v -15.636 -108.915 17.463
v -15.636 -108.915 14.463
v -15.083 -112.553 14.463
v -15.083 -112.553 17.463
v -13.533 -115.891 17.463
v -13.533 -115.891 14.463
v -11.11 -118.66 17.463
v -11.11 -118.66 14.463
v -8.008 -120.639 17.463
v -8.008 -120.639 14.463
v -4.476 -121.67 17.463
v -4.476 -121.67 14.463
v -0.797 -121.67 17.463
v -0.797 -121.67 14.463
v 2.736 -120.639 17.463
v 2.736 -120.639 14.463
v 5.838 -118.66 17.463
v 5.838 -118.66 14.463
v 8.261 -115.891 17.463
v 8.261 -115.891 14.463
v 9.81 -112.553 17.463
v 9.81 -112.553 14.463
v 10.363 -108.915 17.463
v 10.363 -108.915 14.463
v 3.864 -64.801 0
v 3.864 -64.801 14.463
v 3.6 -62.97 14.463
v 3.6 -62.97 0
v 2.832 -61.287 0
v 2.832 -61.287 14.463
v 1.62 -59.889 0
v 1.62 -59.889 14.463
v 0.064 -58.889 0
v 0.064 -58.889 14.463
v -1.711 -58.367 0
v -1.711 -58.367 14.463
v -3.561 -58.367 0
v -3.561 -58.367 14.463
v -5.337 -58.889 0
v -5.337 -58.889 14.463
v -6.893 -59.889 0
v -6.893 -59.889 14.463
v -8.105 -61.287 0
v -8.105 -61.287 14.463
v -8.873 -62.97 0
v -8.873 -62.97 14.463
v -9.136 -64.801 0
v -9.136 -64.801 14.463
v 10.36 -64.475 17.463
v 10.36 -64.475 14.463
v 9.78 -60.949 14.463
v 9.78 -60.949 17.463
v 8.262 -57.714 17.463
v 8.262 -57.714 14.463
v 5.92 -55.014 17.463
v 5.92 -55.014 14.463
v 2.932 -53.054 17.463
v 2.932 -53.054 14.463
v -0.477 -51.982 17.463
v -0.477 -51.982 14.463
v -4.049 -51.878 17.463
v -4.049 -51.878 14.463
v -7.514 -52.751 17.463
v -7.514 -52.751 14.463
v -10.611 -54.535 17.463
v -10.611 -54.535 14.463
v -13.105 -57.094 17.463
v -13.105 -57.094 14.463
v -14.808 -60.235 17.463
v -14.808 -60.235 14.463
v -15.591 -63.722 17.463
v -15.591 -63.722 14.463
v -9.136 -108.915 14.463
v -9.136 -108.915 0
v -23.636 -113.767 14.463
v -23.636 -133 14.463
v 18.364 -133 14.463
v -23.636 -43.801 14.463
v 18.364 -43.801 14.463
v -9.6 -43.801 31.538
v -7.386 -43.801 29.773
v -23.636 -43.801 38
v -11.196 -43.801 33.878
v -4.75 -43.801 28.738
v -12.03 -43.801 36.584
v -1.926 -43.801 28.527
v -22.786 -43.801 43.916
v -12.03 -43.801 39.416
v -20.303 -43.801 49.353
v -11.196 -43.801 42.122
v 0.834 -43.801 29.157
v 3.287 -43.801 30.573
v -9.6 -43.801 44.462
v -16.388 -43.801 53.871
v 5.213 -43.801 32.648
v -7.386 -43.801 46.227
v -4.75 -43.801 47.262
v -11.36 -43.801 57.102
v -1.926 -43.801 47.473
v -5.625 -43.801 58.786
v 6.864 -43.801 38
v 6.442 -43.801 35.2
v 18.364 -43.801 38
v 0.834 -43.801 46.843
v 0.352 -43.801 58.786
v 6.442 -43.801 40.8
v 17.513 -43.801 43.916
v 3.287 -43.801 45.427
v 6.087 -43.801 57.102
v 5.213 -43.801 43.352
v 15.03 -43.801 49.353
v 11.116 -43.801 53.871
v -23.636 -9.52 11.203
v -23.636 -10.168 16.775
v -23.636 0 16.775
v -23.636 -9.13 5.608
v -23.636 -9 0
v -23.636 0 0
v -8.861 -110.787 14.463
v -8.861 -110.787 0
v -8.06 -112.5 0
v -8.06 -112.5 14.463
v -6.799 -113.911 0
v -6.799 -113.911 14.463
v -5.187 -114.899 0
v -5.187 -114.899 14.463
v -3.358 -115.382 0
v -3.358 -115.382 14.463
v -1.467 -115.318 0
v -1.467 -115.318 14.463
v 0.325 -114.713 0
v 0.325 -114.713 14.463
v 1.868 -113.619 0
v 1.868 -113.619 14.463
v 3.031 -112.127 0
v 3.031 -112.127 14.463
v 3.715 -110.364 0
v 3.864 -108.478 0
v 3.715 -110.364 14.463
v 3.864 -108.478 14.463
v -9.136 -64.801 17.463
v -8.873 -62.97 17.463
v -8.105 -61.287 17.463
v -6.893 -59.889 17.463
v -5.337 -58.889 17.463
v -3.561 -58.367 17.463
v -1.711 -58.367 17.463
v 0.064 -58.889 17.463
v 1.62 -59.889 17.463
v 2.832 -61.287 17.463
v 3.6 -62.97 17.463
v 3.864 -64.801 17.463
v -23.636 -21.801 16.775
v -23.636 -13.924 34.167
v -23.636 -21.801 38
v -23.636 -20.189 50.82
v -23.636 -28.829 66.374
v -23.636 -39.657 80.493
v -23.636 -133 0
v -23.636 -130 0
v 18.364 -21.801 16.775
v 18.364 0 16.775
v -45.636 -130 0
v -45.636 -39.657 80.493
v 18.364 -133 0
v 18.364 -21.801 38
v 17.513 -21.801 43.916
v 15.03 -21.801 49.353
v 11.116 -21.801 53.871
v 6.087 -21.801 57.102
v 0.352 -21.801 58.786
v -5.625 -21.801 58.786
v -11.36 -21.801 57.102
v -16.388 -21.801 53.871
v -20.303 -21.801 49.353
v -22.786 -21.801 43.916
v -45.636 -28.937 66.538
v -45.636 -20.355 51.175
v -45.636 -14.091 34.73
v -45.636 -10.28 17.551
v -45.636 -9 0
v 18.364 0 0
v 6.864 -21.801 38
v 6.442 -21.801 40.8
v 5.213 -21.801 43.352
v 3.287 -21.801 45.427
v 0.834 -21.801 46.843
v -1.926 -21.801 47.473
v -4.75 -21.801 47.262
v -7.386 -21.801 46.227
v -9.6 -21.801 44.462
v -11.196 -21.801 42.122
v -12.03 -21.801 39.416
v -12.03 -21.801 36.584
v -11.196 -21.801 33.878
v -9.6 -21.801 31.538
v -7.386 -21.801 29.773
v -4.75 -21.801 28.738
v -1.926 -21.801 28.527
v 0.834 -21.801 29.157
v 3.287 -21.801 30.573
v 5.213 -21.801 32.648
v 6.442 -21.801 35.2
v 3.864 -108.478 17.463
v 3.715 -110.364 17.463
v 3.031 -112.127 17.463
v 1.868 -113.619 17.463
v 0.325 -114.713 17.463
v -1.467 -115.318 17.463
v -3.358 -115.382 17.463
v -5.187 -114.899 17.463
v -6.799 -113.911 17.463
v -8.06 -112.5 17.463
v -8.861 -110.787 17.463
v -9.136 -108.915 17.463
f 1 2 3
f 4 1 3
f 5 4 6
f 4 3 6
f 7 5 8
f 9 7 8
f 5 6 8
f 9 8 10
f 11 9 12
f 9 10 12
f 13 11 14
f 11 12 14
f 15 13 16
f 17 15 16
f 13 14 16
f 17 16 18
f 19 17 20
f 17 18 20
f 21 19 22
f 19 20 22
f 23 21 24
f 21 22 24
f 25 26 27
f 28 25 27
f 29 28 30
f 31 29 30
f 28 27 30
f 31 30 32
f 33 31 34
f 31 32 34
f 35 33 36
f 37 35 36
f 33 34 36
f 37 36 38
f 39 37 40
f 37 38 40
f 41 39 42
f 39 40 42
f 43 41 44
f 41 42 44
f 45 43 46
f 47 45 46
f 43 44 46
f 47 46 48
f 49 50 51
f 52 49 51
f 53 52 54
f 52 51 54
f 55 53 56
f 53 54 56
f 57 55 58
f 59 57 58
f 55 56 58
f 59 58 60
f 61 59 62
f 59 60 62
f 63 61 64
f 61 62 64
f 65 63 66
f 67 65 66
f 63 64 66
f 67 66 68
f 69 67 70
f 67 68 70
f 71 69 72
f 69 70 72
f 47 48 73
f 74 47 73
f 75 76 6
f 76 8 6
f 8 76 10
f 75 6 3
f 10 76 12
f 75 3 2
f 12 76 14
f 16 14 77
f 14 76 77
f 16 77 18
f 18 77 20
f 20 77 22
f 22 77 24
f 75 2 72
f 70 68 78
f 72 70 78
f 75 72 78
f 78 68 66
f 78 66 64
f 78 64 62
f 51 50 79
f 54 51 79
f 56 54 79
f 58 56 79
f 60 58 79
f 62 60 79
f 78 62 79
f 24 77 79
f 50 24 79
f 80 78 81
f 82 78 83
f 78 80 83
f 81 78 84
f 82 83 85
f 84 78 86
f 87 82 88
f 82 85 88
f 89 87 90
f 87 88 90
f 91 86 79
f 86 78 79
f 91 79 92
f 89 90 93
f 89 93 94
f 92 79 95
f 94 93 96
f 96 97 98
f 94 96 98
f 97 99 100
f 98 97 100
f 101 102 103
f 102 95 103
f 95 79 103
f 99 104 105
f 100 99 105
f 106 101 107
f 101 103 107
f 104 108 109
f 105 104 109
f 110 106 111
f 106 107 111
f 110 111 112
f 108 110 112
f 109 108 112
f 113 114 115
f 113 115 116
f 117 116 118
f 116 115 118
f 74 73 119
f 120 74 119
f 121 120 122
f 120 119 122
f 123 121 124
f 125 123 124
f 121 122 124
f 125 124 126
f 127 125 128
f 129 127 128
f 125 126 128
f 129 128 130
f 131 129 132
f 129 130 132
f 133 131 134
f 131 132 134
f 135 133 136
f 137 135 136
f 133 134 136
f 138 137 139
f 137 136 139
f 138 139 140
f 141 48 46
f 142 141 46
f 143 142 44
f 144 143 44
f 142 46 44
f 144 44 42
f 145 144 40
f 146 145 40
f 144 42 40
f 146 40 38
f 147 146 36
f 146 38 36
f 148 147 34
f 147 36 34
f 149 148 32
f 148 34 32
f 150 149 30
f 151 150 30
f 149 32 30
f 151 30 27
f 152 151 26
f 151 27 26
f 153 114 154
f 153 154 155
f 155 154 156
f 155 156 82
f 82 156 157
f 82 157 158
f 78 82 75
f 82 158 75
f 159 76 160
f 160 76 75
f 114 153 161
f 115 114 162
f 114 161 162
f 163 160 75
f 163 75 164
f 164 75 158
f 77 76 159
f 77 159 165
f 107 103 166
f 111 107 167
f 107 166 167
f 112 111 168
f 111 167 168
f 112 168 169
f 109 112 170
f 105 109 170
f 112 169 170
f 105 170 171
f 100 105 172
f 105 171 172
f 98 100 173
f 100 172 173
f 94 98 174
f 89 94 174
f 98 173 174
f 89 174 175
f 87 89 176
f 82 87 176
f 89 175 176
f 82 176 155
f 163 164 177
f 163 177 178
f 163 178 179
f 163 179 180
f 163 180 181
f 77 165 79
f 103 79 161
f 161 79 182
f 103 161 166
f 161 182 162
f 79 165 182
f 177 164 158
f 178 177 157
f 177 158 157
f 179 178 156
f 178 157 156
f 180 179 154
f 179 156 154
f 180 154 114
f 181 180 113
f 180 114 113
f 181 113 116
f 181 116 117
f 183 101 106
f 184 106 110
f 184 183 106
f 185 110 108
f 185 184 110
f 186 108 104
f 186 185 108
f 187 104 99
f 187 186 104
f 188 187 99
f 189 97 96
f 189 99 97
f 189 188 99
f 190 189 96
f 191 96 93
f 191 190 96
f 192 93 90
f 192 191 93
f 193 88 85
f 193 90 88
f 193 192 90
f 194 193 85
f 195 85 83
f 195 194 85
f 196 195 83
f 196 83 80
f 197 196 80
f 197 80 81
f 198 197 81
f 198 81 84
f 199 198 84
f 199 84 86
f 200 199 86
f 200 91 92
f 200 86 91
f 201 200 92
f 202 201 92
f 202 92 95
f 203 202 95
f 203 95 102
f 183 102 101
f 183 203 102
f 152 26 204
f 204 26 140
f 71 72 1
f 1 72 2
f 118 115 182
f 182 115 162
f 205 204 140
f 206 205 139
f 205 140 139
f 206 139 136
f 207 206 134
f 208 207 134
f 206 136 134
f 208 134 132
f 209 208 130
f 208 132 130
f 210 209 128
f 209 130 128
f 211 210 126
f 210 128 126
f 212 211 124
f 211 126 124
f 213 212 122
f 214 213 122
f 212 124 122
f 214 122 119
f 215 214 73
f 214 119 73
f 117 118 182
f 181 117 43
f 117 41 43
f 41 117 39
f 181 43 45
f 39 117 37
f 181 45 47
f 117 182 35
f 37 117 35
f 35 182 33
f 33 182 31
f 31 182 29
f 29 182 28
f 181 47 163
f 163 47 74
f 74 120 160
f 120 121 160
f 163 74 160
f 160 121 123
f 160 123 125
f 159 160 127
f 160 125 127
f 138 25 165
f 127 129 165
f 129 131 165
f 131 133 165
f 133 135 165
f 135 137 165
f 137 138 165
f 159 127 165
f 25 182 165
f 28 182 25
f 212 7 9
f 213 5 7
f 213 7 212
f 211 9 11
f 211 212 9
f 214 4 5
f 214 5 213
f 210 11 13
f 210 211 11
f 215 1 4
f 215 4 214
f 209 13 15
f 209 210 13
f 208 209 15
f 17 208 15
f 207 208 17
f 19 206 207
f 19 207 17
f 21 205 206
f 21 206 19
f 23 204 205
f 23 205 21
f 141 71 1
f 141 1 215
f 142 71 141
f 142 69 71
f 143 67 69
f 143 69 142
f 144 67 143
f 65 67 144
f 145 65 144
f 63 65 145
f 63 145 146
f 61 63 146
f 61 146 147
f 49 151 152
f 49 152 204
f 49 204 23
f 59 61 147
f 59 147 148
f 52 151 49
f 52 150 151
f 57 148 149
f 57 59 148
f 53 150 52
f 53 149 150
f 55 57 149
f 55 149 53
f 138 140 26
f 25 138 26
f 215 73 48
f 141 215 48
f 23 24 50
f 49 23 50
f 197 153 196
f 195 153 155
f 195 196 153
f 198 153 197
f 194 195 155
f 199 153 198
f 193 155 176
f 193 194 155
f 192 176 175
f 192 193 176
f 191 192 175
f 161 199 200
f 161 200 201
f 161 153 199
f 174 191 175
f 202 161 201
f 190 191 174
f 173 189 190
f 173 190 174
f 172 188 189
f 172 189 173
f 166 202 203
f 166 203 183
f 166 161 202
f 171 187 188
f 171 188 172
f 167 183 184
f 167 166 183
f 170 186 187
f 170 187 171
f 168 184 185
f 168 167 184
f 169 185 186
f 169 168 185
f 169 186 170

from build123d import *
from build123d import SkipClean  # not in build123d's __all__

# Parameters (mm, degrees)
F0_W          = 42
F0_H          = 16
F0_R          = 9.5
F1_DEPTH      = 133
F2_W          = 35.961864282
F2_H          = 49.2198635868
F3_DEPTH      = 23.6373633247
F3_DEPTH_BACK = 25
F4_W          = 102.4302720154
F4_H          = 59.7613004169
F5_DEPTH      = 25
F5_DEPTH_BACK = 25
F7_DEPTH      = 22
F9_DEPTH      = 25
F10_DEPTH     = 3


with BuildPart() as f1:
    # F0 (on Front) → F1 (new body)
    with BuildSketch(Plane.XZ):
        with Locations((-2.6363633247, 8)):
            Rectangle(F0_W, F0_H)
        with BuildLine():
            Line((-23.6363633247, 38), (-23.6363633247, 16))
            Line((-23.6363633247, 16), (18.3636366753, 16))
            Line((18.3636366753, 16), (18.3636366753, 38))
            ThreePointArc((18.3636366753, 38), (-2.6363633247, 59), (-23.6363633247, 38))
        make_face()
        with Locations((-2.6363633247, 38)):
            Circle(F0_R, mode=Mode.SUBTRACT)
    extrude(amount=F1_DEPTH)

    # F2 (on Right) → F3 (cut, two sides)
    with BuildSketch(Plane.YZ) as f3_sk:
        with Locations((-3.8203388158, 41.385004092)):
            Rectangle(F2_W, F2_H)
    extrude(amount=-F3_DEPTH, mode=Mode.SUBTRACT)
    extrude(f3_sk.sketch, amount=F3_DEPTH_BACK, mode=Mode.SUBTRACT)

    # F4 (on Right) → F5 (cut, two sides)
    with BuildSketch(Plane.YZ) as f5_sk:
        with Locations((-95.0164069645, 44.3436447531)):
            Rectangle(F4_W, F4_H)
    extrude(amount=-F5_DEPTH, mode=Mode.SUBTRACT)
    extrude(f5_sk.sketch, amount=F5_DEPTH_BACK, mode=Mode.SUBTRACT)

    # F6 (on face) → F7 (join)
    with BuildSketch(Plane(origin=(-23.6363633247, 0, 0), x_dir=(0, -1, 0), z_dir=(-1, 0, 0))):
        with BuildLine():
            Line((9, 0), (130, 0))
            Line((130, 0), (39.6567079743, 80.4927921367))
            ThreePointArc((39.6567079743, 80.4927921367), (16.9236135723, 43.0665860319), (9, 0))
        make_face()
    extrude(amount=F7_DEPTH)

    # F8 (on face) → F9 (cut)
    with BuildSketch(Plane.XY.offset(14.4629945447)):
        with BuildLine():
            Line((3.8636366753, -108.4778859565), (3.8636366753, -64.8012709567))
            ThreePointArc((3.8636366753, -64.8012709567), (-2.6363633247, -58.3012709567), (-9.1363633247, -64.8012709567))
            Line((-9.1363633247, -64.8012709567), (-9.1363633247, -108.9152499387))
            ThreePointArc((-9.1363633247, -108.9152499387), (-2.410200406, -115.4189274994), (3.8636366753, -108.4778859565))
        make_face()
    extrude(amount=-F9_DEPTH, mode=Mode.SUBTRACT)

    # F8 (on face) → F10 (join)
    with BuildSketch(Plane.XY.offset(14.4629945447)):
        with BuildLine():
            Line((10.3631370038, -108.9152499387), (10.3595433171, -64.4750646478))
            ThreePointArc((10.3595433171, -64.4750646478), (-2.2592864442, -51.8067408373), (-15.5914860736, -63.7220144708))
            Line((-15.5914860736, -63.7220144708), (-15.6358636533, -108.9152499387))
            ThreePointArc((-15.6358636533, -108.9152499387), (-2.6363633247, -121.8012709567), (10.3631370038, -108.9152499387))
        make_face()
        with BuildLine():
            ThreePointArc((-9.1363633247, -64.8012709567), (-2.6363633247, -58.3012709567), (3.8636366753, -64.8012709567))
            Line((3.8636366753, -64.8012709567), (3.8636366753, -108.4778859565))
            ThreePointArc((3.8636366753, -108.4778859565), (-2.410200406, -115.4189274994), (-9.1363633247, -108.9152499387))
            Line((-9.1363633247, -108.9152499387), (-9.1363633247, -64.8012709567))
        make_face(mode=Mode.SUBTRACT)
    with SkipClean():  # cleaning this boolean's faces spoils the solid; the shape is the same uncleaned
        extrude(amount=F10_DEPTH)


solid = f1.part
